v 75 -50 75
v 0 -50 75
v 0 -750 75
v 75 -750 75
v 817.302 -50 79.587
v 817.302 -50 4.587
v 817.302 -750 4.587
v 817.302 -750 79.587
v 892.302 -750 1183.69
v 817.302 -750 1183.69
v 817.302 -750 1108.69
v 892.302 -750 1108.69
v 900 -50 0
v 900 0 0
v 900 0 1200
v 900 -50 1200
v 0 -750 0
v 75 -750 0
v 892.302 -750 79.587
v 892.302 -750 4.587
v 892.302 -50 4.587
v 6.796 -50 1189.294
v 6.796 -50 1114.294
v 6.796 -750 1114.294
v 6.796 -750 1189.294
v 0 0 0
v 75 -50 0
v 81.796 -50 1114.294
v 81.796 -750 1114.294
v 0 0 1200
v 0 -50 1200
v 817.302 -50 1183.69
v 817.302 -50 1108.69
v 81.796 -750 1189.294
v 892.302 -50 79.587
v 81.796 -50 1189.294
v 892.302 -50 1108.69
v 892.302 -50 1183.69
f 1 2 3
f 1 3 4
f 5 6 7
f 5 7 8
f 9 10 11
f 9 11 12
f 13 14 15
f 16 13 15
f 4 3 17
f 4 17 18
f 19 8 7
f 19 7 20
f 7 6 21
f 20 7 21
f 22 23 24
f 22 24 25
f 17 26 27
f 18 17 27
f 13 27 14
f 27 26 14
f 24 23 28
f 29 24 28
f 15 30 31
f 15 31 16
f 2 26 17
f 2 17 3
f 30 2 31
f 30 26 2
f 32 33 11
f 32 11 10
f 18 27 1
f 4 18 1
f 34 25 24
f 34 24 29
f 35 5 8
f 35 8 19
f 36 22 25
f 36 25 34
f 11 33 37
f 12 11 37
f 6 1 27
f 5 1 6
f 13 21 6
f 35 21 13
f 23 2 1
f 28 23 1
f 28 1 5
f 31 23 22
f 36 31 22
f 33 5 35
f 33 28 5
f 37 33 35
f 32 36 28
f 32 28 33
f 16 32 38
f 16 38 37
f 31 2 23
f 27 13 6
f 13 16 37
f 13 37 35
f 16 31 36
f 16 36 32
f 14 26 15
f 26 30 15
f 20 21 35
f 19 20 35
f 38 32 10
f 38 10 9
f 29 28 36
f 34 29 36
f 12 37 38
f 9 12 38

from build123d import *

# Parameters (mm, degrees)
SKETCH_W     = 900
SKETCH_H     = 1200
PAD_DEPTH    = 50
SKETCH001_W  = 75
SKETCH001_H  = 75
PAD001_DEPTH = 750
SKETCH002_W  = 75
SKETCH002_H  = 75
PAD002_DEPTH = 750
SKETCH003_W  = 75
SKETCH003_H  = 75
PAD003_DEPTH = 750
SKETCH004_W  = 75
SKETCH004_H  = 75
PAD004_DEPTH = 750


with BuildPart() as part:
    # Sketch → Pad (new body)
    with BuildSketch(Plane.XZ):
        with Locations((450, 600)):
            Rectangle(SKETCH_W, SKETCH_H)
    extrude(amount=PAD_DEPTH)

    # Sketch001 → Pad001 (join)
    with BuildSketch(Plane.XZ):
        with Locations((37.5, 37.5)):
            Rectangle(SKETCH001_W, SKETCH001_H)
    extrude(amount=PAD001_DEPTH)

    # Sketch002 → Pad002 (join)
    with BuildSketch(Plane.XZ):
        with Locations((44.296024, 1151.794312)):
            Rectangle(SKETCH002_W, SKETCH002_H)
    extrude(amount=PAD002_DEPTH)

    # Sketch003 → Pad003 (join)
    with BuildSketch(Plane.XZ):
        with Locations((854.802246, 1146.189819)):
            Rectangle(SKETCH003_W, SKETCH003_H)
    extrude(amount=PAD003_DEPTH)

    # Sketch004 → Pad004 (join)
    with BuildSketch(Plane.XZ):
        with Locations((854.802002, 42.086505)):
            Rectangle(SKETCH004_W, SKETCH004_H)
    extrude(amount=PAD004_DEPTH)


solid = part.part
